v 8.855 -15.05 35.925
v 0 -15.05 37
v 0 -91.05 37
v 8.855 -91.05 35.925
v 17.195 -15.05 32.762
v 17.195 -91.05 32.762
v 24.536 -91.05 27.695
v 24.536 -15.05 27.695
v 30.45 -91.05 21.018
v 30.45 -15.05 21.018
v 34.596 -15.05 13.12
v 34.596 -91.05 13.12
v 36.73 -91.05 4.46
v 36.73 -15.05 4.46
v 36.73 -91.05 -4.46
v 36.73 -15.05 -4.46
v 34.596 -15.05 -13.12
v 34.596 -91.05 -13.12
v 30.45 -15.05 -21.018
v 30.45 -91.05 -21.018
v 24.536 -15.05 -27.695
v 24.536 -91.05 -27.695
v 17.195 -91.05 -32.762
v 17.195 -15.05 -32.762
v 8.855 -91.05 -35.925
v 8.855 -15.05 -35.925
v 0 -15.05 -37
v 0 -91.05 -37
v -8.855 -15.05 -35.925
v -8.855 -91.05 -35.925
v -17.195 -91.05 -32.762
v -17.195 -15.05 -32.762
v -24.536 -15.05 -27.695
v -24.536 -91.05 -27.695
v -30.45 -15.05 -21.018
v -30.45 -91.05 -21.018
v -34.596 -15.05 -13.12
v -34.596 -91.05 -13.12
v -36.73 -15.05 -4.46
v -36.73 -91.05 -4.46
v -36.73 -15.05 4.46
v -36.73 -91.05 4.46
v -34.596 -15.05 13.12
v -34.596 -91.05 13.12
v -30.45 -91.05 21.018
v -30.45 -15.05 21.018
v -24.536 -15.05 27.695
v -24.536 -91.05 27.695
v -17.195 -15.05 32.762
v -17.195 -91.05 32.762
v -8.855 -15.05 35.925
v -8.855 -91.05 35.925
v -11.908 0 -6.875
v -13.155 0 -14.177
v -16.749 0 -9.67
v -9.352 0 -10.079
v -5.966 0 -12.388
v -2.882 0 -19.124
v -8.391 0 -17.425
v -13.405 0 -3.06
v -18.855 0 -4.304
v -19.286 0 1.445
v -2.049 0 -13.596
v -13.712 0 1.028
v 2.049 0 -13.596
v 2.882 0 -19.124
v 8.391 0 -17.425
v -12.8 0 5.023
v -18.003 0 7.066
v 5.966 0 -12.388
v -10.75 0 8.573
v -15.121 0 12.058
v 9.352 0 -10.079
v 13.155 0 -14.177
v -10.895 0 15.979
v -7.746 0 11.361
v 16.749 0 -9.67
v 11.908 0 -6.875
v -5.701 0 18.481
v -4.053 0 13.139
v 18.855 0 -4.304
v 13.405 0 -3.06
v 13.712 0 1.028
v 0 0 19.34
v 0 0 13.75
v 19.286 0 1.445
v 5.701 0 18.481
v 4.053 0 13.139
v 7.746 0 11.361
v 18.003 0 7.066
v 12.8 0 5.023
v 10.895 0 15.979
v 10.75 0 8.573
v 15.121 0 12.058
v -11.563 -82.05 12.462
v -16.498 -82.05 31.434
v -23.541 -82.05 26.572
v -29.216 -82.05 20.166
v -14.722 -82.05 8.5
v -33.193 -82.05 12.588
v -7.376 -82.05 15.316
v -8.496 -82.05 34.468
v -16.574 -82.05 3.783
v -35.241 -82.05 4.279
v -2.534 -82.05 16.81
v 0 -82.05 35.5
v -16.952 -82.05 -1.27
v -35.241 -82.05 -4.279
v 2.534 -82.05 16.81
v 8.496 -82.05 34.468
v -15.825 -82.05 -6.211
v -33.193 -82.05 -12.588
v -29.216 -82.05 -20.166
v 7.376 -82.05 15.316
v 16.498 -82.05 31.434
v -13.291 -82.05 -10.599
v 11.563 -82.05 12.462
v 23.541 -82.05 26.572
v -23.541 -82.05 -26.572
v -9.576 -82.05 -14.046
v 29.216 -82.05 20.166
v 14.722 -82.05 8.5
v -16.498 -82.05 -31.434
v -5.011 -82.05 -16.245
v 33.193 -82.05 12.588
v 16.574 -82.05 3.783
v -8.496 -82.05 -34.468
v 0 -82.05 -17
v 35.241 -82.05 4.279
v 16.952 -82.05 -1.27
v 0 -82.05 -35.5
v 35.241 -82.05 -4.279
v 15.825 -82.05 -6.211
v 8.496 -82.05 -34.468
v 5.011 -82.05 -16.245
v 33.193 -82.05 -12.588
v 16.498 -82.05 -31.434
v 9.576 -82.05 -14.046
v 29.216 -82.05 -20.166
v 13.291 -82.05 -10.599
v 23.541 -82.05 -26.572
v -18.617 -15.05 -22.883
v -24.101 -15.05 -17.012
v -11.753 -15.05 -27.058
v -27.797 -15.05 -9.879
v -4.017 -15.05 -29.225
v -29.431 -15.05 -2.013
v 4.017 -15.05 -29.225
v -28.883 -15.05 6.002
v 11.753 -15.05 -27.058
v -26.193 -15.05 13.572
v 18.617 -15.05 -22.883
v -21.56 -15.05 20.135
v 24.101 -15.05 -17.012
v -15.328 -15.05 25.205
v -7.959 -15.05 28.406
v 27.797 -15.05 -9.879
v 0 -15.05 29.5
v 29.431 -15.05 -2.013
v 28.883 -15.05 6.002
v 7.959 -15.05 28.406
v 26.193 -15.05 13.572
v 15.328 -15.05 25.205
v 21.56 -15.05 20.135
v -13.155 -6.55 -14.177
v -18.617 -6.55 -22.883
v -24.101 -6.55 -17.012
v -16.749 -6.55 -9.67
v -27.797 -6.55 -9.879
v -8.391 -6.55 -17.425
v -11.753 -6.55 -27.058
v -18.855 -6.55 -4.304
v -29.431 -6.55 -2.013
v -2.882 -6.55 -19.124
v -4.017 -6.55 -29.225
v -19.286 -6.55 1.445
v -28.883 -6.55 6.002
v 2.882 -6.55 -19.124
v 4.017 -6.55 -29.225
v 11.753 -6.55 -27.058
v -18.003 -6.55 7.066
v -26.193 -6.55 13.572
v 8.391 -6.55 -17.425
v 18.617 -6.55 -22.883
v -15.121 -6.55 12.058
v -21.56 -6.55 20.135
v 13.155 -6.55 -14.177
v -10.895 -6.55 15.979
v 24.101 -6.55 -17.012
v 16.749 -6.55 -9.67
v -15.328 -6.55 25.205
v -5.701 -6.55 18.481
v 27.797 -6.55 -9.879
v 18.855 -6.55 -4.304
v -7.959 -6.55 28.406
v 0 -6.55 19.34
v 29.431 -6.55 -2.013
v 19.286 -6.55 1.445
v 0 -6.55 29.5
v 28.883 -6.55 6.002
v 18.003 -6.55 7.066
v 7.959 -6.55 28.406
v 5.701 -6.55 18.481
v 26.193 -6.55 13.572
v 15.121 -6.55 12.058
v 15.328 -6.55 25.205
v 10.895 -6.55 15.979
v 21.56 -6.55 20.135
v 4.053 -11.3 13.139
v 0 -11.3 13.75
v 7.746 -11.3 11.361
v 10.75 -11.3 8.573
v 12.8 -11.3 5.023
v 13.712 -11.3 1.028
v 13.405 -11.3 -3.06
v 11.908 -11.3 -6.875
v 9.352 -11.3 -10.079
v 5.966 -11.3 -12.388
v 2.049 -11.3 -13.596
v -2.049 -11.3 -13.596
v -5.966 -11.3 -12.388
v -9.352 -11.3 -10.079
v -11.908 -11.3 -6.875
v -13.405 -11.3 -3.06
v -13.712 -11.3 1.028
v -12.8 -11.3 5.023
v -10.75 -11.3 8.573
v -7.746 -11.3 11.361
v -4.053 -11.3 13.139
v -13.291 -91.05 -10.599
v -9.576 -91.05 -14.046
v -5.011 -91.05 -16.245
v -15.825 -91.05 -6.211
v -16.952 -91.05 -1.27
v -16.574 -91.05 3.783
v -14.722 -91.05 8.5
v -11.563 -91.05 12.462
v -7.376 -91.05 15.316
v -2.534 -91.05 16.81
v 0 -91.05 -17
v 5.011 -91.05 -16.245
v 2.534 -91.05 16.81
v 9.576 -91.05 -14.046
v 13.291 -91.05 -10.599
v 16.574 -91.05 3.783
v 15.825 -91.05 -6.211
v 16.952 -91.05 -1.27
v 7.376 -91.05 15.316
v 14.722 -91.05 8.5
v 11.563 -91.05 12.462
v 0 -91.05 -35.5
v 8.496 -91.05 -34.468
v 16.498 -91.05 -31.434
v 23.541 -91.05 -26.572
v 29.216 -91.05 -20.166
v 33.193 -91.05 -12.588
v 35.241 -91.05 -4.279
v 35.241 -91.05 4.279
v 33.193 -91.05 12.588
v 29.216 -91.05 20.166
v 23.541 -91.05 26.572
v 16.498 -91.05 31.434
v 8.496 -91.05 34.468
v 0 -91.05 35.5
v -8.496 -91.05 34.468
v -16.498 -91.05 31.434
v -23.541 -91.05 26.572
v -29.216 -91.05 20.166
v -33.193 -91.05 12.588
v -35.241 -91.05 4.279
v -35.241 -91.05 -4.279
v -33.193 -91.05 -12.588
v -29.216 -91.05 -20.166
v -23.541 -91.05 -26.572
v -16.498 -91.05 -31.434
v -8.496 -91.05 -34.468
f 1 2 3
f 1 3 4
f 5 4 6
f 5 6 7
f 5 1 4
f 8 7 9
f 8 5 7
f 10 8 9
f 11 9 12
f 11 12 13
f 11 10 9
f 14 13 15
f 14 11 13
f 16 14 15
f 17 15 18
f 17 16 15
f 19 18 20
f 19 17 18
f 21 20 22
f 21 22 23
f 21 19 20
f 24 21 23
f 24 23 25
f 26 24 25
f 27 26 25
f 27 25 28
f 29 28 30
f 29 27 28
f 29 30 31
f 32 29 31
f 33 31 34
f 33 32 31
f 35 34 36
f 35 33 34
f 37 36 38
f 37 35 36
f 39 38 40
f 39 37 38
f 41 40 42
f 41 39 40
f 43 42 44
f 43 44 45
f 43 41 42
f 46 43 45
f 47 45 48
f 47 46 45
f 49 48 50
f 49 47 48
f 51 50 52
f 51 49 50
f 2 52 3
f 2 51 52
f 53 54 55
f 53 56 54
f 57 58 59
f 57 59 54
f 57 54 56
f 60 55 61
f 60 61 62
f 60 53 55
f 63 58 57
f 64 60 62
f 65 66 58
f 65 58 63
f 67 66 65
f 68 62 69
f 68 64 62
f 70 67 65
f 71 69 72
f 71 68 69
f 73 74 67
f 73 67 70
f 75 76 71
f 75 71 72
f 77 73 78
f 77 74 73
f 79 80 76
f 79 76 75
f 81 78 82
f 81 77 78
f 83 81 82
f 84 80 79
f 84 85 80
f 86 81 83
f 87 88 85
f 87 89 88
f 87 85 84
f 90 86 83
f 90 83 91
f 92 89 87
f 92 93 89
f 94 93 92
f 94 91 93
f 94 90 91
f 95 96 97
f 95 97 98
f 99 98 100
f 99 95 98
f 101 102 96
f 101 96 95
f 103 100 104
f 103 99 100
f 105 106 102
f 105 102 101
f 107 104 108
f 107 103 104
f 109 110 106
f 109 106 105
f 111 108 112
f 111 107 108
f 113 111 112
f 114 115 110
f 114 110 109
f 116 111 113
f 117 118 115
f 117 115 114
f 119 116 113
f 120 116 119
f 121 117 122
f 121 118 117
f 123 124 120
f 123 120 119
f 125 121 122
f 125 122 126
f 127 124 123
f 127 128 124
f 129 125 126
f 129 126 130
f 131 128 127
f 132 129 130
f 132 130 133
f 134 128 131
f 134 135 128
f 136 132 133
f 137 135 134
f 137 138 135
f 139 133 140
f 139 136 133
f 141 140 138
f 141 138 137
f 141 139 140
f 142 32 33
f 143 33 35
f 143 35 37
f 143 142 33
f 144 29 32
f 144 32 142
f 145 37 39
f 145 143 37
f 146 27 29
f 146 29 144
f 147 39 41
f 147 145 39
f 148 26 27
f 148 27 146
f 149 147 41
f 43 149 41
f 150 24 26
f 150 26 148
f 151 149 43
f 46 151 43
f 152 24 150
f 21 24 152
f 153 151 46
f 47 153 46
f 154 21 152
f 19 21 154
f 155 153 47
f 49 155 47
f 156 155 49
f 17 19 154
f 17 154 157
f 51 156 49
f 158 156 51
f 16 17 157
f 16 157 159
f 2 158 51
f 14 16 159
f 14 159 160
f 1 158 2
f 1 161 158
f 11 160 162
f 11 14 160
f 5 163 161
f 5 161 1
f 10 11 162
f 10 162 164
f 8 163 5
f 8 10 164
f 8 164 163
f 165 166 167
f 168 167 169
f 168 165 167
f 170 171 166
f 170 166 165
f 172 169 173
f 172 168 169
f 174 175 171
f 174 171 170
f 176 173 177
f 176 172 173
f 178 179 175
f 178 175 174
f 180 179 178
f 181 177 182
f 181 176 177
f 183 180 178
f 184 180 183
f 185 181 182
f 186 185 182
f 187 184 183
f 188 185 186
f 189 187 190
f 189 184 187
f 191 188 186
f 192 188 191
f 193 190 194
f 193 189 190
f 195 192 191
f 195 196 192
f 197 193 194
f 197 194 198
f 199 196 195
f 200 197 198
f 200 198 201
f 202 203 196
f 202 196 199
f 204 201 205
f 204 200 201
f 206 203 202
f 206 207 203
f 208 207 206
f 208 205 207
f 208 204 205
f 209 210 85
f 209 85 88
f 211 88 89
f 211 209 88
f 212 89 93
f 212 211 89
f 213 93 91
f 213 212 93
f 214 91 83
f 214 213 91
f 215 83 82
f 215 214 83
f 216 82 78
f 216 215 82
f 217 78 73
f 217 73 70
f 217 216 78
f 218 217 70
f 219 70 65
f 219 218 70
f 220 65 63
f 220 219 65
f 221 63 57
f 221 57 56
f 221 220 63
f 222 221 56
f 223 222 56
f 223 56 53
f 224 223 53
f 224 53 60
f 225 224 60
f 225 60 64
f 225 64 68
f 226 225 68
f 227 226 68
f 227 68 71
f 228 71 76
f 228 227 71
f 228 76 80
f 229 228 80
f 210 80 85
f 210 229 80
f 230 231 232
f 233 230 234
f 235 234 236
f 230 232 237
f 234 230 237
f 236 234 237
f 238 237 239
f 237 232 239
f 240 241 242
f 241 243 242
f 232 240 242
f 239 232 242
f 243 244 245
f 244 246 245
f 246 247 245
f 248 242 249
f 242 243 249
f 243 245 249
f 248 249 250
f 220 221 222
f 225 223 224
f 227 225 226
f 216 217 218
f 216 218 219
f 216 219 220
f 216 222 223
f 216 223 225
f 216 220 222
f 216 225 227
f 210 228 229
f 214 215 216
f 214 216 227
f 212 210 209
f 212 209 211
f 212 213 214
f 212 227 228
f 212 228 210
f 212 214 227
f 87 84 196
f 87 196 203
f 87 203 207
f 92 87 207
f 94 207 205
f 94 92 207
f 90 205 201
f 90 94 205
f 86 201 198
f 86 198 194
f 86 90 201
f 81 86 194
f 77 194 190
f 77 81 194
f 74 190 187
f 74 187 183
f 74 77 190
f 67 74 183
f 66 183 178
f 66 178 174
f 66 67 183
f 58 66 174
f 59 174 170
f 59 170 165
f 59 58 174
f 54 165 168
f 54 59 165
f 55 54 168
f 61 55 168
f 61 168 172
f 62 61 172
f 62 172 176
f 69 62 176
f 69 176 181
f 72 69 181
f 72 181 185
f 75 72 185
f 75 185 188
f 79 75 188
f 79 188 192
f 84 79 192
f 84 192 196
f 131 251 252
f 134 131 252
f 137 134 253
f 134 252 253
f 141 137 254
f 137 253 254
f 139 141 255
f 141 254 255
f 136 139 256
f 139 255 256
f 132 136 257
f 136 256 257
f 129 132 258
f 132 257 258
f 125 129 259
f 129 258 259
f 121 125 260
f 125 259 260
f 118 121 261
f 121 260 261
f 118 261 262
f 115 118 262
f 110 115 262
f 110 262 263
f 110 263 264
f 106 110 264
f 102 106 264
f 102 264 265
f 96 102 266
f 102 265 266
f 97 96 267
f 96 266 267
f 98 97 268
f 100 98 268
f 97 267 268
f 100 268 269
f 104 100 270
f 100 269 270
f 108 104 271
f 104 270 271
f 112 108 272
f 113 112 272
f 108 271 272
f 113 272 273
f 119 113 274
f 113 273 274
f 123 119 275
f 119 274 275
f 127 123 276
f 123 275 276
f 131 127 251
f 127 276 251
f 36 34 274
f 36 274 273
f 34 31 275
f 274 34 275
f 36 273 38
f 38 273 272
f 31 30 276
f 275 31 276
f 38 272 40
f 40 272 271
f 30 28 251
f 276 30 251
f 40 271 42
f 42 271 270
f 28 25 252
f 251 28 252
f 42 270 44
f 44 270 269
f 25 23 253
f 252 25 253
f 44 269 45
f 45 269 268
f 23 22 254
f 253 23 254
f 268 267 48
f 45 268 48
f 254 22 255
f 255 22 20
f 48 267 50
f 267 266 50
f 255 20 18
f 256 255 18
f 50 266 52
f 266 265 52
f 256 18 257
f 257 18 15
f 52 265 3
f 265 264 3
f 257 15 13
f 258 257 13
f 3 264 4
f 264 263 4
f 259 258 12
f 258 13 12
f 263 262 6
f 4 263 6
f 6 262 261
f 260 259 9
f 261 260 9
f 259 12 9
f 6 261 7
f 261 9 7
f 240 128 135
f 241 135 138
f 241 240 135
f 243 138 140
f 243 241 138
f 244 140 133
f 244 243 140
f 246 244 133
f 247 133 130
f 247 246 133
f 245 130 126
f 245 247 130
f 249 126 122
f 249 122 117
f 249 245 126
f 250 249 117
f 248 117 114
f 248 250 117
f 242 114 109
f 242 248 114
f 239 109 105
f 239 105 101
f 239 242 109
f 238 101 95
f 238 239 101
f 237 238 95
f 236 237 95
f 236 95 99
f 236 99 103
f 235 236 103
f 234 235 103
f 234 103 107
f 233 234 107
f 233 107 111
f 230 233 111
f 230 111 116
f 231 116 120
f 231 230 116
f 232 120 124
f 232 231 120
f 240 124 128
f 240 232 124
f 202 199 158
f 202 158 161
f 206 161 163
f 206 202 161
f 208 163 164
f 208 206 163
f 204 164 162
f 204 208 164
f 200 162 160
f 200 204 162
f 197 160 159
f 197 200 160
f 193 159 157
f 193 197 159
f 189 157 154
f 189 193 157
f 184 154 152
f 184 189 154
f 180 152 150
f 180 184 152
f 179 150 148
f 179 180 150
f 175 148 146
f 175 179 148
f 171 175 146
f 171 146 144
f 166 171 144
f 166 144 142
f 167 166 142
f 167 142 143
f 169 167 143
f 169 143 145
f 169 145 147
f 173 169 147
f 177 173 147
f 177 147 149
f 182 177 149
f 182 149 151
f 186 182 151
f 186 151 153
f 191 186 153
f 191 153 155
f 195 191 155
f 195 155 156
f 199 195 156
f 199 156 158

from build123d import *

# Parameters (mm, degrees)
SKETCH_5_R          = 37
EXTRUDE_1_DEPTH     = 76
EXTRUDE_2_REACH     = 101.389
SKETCH_4_R          = 29.5
EXTRUDE_3_REACH     = 107.015
SKETCH_1_R          = 19.34
SKETCH_2_R          = 13.75
CUT_EXTRUDE_1_DEPTH = 11.3
SKETCH_7_R          = 35.5
SKETCH_7_R_2        = 17
CUT_EXTRUDE_2_DEPTH = 9


with BuildPart() as part:
    # Эскиз5 → Бобышка-Вытянуть1 (new body)
    with BuildSketch(Plane(origin=(0, -15.05, 0), x_dir=(1, 0, 0), z_dir=(0, 1, 0))):
        with Locations(Location((0, 0, 0), (0, 0, 270))):
            Circle(SKETCH_5_R)
    extrude(amount=-EXTRUDE_1_DEPTH)

    # Эскиз4 → Бобышка-Вытянуть2 (add, up to next)
    with BuildSketch(Plane(origin=(0, -6.55, 0), x_dir=(1, 0, 0), z_dir=(0, 1, 0)), mode=Mode.PRIVATE) as extrude_2_sk1:
        with Locations(Location((0, 0, 0), (0, 0, 270))):
            Circle(SKETCH_4_R)
    extrude_2_tool1 = extrude(extrude_2_sk1.sketch, amount=-EXTRUDE_2_REACH, mode=Mode.PRIVATE) - part.part
    add(extrude_2_tool1.solids().sort_by_distance((0, -6.55, 0))[0])

    # Эскиз1 → Бобышка-Вытянуть3 (add, up to next)
    with BuildSketch(Plane(origin=(0, 0, 0), x_dir=(1, 0, 0), z_dir=(0, 1, 0)), mode=Mode.PRIVATE) as extrude_3_sk1:
        with Locations(Location((0, 0, 0), (0, 0, 270))):
            Circle(SKETCH_1_R)
    extrude_3_tool1 = extrude(extrude_3_sk1.sketch, amount=-EXTRUDE_3_REACH, mode=Mode.PRIVATE) - part.part
    add(extrude_3_tool1.solids().sort_by_distance((0, 0, 0))[0])

    # Эскиз2 → Вырез-Вытянуть1 (cut)
    with BuildSketch(Plane(origin=(0, -11.3, 0), x_dir=(1, 0, 0), z_dir=(0, 1, 0))):
        with Locations(Location((0, 0, 0), (0, 0, 270))):
            Circle(SKETCH_2_R)
    extrude(amount=CUT_EXTRUDE_1_DEPTH, mode=Mode.SUBTRACT)

    # Эскиз7 → Вырез-Вытянуть2 (cut)
    with BuildSketch(Plane.XZ.offset(91.05)):
        with Locations(Location((0, 0, 0), (0, 0, 270))):
            Circle(SKETCH_7_R)
        with Locations(Location((0, 0, 0), (0, 0, 270))):
            Circle(SKETCH_7_R_2, mode=Mode.SUBTRACT)
    extrude(amount=-CUT_EXTRUDE_2_DEPTH, mode=Mode.SUBTRACT)


solid = part.part
